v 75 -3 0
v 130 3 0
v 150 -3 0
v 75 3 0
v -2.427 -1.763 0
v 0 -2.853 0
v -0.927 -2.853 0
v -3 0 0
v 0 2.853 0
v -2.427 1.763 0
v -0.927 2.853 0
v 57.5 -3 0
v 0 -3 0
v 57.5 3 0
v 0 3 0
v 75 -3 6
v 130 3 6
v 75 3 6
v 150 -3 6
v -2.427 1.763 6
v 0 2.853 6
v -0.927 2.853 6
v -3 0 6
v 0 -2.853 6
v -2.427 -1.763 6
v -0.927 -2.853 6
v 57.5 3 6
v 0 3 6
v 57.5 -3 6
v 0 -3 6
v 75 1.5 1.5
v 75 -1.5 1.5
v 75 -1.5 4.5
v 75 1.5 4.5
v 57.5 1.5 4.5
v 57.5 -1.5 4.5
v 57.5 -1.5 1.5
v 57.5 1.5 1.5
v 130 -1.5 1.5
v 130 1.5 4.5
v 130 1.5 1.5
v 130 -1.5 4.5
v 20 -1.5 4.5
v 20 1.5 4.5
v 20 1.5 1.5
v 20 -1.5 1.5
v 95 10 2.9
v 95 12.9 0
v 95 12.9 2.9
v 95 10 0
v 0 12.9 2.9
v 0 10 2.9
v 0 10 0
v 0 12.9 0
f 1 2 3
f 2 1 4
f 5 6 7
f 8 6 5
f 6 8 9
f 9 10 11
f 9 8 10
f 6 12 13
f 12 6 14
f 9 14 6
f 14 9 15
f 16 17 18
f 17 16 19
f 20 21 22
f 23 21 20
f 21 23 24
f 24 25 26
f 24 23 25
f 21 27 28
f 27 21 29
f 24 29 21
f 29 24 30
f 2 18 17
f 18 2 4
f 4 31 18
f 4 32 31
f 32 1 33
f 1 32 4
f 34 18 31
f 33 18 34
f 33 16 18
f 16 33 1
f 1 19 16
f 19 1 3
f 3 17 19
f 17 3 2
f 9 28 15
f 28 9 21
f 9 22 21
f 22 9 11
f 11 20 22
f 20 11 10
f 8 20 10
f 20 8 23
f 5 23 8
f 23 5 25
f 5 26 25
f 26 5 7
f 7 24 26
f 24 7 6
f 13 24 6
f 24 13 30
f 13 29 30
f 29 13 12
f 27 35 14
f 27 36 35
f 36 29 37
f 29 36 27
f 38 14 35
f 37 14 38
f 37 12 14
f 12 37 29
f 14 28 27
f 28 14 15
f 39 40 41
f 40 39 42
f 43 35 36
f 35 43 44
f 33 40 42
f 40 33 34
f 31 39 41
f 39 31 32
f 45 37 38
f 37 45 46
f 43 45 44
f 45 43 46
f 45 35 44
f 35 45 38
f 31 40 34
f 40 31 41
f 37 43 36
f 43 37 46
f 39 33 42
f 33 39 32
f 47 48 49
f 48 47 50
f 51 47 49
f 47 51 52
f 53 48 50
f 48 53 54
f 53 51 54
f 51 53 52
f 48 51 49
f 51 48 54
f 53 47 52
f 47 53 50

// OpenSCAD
spring_length = 35; // mm
band_thickness = 6; // mm
band_length = 150; // mm

guide_thickness = band_thickness / 2;

difference() {
    linear_extrude(band_thickness) {
        difference() {
            union() {
                circle(band_thickness/2);
                translate([0, band_thickness / -2]) {
                    square([band_length - 20, band_thickness]);
                    polygon(points = [
                        [band_length - 20, 0], 
                        [band_length, 0], 
                        [band_length - 20, band_thickness]
                    ]);
                }
            }
            translate([(band_length - spring_length) / 2, band_thickness / -2]) {
                square([spring_length / 2, band_thickness]);
            }
        }
    }
    translate([20, guide_thickness / -2, guide_thickness / 2]) {
        cube([band_length - 40, guide_thickness, guide_thickness]);
    }
}

translate([0, 10, 0]) {
    cube([
        band_length - 20 - spring_length, 
        guide_thickness - 0.1, 
        guide_thickness - 0.1
    ]);
}
